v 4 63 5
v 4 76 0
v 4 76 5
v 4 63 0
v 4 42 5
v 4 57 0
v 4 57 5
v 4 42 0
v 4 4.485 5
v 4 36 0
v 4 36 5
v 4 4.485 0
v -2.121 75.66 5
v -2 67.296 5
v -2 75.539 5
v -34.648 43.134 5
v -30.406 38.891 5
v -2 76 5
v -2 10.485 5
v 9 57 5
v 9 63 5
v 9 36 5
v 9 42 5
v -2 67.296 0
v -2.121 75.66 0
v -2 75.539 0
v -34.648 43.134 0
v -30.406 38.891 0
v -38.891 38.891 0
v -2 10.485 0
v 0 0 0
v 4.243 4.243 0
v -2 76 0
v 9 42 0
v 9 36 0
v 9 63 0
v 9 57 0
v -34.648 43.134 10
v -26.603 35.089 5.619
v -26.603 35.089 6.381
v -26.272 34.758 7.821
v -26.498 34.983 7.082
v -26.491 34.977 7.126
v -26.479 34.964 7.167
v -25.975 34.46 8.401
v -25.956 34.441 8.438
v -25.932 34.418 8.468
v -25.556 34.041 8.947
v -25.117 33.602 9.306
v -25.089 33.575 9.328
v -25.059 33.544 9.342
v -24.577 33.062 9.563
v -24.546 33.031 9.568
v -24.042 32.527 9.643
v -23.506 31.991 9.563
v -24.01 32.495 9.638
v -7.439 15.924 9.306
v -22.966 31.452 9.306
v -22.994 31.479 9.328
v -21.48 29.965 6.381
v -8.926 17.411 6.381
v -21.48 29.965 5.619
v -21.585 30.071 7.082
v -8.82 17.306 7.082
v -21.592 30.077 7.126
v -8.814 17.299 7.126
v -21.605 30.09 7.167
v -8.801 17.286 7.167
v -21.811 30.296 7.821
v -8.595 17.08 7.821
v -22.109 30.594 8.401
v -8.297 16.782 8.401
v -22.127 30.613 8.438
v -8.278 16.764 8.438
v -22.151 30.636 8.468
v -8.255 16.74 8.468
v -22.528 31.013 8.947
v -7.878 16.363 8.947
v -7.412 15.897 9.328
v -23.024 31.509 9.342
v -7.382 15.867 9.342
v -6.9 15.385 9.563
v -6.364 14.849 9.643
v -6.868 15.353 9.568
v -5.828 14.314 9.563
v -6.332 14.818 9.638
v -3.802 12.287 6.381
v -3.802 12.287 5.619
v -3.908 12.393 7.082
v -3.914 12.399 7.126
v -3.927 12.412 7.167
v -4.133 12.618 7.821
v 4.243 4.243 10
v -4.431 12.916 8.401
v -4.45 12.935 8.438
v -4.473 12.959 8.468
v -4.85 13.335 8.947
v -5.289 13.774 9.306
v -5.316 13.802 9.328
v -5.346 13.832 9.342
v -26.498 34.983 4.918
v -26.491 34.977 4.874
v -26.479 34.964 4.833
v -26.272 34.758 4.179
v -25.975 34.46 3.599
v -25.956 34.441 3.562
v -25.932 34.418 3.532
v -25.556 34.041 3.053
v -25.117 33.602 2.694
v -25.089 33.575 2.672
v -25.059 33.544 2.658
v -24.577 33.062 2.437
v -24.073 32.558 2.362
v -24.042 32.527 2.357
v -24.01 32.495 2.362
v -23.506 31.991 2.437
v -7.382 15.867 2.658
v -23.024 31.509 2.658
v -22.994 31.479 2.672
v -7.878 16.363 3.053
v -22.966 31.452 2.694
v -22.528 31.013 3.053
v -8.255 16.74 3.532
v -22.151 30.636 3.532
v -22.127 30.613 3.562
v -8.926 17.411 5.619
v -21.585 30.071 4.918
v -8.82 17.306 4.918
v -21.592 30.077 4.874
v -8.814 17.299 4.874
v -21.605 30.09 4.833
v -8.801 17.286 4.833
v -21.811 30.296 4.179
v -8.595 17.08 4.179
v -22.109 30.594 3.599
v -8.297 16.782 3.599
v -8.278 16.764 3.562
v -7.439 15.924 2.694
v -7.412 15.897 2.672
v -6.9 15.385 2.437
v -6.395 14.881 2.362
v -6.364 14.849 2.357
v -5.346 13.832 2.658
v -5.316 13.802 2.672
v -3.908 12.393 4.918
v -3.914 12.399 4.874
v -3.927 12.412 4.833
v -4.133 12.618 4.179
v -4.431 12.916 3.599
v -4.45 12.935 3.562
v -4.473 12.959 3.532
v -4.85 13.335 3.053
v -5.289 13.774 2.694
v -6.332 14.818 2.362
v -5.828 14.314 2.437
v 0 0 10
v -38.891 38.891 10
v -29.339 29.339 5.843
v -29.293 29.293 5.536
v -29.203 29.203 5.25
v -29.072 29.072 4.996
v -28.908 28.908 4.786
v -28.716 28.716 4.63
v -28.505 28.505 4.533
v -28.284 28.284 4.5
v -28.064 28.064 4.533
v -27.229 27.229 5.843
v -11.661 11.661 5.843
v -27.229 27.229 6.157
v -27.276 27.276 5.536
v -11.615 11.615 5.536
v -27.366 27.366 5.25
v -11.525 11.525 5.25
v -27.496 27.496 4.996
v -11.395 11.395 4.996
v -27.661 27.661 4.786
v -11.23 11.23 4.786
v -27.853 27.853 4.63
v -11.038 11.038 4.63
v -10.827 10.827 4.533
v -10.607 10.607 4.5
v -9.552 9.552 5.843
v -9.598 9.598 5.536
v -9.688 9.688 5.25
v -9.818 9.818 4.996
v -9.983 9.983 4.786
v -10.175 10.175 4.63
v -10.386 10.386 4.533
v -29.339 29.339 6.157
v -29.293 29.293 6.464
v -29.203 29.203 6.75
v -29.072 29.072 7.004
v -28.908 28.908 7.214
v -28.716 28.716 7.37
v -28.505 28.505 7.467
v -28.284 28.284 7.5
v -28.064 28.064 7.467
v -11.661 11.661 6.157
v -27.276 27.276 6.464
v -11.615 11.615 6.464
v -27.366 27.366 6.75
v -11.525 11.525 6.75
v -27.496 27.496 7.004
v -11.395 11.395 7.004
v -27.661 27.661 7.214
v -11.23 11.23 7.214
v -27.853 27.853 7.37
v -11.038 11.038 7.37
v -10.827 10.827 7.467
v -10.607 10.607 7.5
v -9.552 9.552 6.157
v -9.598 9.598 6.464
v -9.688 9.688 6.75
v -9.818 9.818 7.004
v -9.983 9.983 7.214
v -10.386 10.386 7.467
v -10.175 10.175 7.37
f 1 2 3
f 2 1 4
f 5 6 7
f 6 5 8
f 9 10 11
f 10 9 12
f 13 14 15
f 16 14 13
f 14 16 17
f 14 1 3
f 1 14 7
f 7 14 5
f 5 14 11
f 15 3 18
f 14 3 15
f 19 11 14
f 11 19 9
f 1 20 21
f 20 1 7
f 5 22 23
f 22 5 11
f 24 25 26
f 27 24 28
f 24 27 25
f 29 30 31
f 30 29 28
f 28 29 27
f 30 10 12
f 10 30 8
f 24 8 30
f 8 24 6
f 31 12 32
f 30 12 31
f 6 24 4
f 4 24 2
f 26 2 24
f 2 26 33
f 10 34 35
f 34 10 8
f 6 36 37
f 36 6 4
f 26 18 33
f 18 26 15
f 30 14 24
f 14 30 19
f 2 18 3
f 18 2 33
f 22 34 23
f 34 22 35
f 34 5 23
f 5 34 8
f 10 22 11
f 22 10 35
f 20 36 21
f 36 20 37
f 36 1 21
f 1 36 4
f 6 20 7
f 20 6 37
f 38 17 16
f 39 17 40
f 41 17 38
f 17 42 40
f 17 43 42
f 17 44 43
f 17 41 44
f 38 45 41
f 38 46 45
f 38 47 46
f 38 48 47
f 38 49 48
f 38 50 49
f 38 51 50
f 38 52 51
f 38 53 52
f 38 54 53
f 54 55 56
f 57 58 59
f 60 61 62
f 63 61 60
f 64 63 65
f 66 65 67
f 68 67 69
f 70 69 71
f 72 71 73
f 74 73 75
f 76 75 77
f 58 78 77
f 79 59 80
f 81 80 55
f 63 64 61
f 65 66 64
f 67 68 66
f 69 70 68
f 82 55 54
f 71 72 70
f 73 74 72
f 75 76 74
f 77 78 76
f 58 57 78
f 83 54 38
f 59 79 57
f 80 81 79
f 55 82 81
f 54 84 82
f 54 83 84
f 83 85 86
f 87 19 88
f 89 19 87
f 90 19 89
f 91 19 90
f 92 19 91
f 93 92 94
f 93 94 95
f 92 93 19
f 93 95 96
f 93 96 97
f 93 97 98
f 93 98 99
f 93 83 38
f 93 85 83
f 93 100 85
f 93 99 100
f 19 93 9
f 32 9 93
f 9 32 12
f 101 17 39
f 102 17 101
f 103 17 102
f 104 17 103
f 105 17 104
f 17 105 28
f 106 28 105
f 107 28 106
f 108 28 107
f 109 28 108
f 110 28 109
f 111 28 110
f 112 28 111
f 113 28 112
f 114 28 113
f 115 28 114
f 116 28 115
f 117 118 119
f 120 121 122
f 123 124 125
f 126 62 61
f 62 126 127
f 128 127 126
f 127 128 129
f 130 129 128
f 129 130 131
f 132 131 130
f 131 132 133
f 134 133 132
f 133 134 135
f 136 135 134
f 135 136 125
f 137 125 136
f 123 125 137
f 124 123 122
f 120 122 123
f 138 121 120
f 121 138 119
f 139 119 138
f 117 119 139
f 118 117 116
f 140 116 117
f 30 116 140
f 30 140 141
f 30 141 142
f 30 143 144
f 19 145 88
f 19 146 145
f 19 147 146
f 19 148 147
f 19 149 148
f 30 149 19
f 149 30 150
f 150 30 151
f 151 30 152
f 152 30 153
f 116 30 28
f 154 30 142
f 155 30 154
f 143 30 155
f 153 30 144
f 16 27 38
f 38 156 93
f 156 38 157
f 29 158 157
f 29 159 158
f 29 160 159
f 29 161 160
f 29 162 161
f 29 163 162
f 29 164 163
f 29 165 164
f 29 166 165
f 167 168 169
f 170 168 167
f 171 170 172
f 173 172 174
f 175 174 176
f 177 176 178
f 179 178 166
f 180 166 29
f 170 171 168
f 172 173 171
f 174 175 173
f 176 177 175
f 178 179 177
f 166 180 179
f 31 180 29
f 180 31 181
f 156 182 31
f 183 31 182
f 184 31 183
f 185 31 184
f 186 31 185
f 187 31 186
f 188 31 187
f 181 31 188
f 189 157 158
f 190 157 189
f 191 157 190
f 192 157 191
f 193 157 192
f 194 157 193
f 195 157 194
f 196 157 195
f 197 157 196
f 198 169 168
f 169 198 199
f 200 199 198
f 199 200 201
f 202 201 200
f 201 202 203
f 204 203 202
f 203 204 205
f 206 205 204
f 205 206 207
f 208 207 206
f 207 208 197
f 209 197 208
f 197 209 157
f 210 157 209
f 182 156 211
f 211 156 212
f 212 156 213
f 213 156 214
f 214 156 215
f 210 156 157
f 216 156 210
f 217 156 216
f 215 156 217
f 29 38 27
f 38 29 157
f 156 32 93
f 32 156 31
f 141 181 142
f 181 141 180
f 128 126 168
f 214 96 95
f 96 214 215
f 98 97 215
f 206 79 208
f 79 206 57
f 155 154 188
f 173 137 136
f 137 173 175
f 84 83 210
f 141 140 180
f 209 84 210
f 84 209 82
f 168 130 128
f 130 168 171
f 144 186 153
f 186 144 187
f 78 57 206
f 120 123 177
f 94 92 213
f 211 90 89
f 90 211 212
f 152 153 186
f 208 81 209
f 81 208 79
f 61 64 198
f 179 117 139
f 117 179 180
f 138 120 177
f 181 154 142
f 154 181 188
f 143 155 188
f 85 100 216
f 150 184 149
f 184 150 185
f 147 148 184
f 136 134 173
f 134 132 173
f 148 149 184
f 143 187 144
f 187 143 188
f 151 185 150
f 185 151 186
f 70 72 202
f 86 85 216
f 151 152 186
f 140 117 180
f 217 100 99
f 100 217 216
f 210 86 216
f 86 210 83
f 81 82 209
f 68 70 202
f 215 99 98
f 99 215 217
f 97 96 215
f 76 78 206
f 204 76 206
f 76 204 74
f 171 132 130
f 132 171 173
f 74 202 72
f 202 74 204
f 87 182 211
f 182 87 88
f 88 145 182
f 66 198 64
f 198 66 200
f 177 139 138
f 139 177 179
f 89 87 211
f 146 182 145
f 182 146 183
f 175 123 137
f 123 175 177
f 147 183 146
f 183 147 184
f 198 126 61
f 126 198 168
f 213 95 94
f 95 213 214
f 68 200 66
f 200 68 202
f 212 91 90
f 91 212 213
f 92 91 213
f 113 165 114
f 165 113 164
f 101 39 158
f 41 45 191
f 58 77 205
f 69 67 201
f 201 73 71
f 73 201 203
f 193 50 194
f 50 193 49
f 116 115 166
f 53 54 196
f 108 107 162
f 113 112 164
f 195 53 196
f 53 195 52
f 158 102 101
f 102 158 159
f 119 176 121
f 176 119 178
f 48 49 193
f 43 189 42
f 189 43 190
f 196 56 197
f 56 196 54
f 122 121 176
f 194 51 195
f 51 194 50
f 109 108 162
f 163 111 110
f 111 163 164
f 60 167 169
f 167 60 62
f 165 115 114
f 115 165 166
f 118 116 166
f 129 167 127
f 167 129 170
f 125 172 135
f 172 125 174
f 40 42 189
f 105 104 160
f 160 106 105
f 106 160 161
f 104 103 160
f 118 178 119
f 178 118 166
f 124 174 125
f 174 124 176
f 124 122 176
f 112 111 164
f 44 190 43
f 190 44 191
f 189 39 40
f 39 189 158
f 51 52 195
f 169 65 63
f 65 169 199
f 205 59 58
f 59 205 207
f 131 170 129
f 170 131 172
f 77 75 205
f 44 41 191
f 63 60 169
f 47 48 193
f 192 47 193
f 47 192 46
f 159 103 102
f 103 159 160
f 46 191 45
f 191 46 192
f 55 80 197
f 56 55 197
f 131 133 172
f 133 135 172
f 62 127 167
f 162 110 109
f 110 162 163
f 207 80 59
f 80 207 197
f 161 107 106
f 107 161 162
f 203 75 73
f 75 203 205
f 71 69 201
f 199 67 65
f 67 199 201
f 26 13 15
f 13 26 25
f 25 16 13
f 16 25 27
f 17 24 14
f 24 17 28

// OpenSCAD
$fn = 30;

translate([-2, 4, 0]) {
    cube([6, 72, 5]);
    translate([6, 32, 0])cube([5, 6, 5]);
    translate([6, 53, 0]) cube([5, 6, 5]);
}

 rotate ([0, 0, 45]) translate([0, 49, 0]) cube([52, 6, 5]);

rotate ([0, 0, 45])
difference() {
    cube([6, 55, 10]);
    translate ([0, 15, 6]) rotate ([0, 90, 0]) cylinder(h = 7, d1 = 3, d2 = 8);
    translate ([0, 40, 6]) rotate ([0, 90, 0]) cylinder(h = 7, d1 = 3, d2 = 8);
};
